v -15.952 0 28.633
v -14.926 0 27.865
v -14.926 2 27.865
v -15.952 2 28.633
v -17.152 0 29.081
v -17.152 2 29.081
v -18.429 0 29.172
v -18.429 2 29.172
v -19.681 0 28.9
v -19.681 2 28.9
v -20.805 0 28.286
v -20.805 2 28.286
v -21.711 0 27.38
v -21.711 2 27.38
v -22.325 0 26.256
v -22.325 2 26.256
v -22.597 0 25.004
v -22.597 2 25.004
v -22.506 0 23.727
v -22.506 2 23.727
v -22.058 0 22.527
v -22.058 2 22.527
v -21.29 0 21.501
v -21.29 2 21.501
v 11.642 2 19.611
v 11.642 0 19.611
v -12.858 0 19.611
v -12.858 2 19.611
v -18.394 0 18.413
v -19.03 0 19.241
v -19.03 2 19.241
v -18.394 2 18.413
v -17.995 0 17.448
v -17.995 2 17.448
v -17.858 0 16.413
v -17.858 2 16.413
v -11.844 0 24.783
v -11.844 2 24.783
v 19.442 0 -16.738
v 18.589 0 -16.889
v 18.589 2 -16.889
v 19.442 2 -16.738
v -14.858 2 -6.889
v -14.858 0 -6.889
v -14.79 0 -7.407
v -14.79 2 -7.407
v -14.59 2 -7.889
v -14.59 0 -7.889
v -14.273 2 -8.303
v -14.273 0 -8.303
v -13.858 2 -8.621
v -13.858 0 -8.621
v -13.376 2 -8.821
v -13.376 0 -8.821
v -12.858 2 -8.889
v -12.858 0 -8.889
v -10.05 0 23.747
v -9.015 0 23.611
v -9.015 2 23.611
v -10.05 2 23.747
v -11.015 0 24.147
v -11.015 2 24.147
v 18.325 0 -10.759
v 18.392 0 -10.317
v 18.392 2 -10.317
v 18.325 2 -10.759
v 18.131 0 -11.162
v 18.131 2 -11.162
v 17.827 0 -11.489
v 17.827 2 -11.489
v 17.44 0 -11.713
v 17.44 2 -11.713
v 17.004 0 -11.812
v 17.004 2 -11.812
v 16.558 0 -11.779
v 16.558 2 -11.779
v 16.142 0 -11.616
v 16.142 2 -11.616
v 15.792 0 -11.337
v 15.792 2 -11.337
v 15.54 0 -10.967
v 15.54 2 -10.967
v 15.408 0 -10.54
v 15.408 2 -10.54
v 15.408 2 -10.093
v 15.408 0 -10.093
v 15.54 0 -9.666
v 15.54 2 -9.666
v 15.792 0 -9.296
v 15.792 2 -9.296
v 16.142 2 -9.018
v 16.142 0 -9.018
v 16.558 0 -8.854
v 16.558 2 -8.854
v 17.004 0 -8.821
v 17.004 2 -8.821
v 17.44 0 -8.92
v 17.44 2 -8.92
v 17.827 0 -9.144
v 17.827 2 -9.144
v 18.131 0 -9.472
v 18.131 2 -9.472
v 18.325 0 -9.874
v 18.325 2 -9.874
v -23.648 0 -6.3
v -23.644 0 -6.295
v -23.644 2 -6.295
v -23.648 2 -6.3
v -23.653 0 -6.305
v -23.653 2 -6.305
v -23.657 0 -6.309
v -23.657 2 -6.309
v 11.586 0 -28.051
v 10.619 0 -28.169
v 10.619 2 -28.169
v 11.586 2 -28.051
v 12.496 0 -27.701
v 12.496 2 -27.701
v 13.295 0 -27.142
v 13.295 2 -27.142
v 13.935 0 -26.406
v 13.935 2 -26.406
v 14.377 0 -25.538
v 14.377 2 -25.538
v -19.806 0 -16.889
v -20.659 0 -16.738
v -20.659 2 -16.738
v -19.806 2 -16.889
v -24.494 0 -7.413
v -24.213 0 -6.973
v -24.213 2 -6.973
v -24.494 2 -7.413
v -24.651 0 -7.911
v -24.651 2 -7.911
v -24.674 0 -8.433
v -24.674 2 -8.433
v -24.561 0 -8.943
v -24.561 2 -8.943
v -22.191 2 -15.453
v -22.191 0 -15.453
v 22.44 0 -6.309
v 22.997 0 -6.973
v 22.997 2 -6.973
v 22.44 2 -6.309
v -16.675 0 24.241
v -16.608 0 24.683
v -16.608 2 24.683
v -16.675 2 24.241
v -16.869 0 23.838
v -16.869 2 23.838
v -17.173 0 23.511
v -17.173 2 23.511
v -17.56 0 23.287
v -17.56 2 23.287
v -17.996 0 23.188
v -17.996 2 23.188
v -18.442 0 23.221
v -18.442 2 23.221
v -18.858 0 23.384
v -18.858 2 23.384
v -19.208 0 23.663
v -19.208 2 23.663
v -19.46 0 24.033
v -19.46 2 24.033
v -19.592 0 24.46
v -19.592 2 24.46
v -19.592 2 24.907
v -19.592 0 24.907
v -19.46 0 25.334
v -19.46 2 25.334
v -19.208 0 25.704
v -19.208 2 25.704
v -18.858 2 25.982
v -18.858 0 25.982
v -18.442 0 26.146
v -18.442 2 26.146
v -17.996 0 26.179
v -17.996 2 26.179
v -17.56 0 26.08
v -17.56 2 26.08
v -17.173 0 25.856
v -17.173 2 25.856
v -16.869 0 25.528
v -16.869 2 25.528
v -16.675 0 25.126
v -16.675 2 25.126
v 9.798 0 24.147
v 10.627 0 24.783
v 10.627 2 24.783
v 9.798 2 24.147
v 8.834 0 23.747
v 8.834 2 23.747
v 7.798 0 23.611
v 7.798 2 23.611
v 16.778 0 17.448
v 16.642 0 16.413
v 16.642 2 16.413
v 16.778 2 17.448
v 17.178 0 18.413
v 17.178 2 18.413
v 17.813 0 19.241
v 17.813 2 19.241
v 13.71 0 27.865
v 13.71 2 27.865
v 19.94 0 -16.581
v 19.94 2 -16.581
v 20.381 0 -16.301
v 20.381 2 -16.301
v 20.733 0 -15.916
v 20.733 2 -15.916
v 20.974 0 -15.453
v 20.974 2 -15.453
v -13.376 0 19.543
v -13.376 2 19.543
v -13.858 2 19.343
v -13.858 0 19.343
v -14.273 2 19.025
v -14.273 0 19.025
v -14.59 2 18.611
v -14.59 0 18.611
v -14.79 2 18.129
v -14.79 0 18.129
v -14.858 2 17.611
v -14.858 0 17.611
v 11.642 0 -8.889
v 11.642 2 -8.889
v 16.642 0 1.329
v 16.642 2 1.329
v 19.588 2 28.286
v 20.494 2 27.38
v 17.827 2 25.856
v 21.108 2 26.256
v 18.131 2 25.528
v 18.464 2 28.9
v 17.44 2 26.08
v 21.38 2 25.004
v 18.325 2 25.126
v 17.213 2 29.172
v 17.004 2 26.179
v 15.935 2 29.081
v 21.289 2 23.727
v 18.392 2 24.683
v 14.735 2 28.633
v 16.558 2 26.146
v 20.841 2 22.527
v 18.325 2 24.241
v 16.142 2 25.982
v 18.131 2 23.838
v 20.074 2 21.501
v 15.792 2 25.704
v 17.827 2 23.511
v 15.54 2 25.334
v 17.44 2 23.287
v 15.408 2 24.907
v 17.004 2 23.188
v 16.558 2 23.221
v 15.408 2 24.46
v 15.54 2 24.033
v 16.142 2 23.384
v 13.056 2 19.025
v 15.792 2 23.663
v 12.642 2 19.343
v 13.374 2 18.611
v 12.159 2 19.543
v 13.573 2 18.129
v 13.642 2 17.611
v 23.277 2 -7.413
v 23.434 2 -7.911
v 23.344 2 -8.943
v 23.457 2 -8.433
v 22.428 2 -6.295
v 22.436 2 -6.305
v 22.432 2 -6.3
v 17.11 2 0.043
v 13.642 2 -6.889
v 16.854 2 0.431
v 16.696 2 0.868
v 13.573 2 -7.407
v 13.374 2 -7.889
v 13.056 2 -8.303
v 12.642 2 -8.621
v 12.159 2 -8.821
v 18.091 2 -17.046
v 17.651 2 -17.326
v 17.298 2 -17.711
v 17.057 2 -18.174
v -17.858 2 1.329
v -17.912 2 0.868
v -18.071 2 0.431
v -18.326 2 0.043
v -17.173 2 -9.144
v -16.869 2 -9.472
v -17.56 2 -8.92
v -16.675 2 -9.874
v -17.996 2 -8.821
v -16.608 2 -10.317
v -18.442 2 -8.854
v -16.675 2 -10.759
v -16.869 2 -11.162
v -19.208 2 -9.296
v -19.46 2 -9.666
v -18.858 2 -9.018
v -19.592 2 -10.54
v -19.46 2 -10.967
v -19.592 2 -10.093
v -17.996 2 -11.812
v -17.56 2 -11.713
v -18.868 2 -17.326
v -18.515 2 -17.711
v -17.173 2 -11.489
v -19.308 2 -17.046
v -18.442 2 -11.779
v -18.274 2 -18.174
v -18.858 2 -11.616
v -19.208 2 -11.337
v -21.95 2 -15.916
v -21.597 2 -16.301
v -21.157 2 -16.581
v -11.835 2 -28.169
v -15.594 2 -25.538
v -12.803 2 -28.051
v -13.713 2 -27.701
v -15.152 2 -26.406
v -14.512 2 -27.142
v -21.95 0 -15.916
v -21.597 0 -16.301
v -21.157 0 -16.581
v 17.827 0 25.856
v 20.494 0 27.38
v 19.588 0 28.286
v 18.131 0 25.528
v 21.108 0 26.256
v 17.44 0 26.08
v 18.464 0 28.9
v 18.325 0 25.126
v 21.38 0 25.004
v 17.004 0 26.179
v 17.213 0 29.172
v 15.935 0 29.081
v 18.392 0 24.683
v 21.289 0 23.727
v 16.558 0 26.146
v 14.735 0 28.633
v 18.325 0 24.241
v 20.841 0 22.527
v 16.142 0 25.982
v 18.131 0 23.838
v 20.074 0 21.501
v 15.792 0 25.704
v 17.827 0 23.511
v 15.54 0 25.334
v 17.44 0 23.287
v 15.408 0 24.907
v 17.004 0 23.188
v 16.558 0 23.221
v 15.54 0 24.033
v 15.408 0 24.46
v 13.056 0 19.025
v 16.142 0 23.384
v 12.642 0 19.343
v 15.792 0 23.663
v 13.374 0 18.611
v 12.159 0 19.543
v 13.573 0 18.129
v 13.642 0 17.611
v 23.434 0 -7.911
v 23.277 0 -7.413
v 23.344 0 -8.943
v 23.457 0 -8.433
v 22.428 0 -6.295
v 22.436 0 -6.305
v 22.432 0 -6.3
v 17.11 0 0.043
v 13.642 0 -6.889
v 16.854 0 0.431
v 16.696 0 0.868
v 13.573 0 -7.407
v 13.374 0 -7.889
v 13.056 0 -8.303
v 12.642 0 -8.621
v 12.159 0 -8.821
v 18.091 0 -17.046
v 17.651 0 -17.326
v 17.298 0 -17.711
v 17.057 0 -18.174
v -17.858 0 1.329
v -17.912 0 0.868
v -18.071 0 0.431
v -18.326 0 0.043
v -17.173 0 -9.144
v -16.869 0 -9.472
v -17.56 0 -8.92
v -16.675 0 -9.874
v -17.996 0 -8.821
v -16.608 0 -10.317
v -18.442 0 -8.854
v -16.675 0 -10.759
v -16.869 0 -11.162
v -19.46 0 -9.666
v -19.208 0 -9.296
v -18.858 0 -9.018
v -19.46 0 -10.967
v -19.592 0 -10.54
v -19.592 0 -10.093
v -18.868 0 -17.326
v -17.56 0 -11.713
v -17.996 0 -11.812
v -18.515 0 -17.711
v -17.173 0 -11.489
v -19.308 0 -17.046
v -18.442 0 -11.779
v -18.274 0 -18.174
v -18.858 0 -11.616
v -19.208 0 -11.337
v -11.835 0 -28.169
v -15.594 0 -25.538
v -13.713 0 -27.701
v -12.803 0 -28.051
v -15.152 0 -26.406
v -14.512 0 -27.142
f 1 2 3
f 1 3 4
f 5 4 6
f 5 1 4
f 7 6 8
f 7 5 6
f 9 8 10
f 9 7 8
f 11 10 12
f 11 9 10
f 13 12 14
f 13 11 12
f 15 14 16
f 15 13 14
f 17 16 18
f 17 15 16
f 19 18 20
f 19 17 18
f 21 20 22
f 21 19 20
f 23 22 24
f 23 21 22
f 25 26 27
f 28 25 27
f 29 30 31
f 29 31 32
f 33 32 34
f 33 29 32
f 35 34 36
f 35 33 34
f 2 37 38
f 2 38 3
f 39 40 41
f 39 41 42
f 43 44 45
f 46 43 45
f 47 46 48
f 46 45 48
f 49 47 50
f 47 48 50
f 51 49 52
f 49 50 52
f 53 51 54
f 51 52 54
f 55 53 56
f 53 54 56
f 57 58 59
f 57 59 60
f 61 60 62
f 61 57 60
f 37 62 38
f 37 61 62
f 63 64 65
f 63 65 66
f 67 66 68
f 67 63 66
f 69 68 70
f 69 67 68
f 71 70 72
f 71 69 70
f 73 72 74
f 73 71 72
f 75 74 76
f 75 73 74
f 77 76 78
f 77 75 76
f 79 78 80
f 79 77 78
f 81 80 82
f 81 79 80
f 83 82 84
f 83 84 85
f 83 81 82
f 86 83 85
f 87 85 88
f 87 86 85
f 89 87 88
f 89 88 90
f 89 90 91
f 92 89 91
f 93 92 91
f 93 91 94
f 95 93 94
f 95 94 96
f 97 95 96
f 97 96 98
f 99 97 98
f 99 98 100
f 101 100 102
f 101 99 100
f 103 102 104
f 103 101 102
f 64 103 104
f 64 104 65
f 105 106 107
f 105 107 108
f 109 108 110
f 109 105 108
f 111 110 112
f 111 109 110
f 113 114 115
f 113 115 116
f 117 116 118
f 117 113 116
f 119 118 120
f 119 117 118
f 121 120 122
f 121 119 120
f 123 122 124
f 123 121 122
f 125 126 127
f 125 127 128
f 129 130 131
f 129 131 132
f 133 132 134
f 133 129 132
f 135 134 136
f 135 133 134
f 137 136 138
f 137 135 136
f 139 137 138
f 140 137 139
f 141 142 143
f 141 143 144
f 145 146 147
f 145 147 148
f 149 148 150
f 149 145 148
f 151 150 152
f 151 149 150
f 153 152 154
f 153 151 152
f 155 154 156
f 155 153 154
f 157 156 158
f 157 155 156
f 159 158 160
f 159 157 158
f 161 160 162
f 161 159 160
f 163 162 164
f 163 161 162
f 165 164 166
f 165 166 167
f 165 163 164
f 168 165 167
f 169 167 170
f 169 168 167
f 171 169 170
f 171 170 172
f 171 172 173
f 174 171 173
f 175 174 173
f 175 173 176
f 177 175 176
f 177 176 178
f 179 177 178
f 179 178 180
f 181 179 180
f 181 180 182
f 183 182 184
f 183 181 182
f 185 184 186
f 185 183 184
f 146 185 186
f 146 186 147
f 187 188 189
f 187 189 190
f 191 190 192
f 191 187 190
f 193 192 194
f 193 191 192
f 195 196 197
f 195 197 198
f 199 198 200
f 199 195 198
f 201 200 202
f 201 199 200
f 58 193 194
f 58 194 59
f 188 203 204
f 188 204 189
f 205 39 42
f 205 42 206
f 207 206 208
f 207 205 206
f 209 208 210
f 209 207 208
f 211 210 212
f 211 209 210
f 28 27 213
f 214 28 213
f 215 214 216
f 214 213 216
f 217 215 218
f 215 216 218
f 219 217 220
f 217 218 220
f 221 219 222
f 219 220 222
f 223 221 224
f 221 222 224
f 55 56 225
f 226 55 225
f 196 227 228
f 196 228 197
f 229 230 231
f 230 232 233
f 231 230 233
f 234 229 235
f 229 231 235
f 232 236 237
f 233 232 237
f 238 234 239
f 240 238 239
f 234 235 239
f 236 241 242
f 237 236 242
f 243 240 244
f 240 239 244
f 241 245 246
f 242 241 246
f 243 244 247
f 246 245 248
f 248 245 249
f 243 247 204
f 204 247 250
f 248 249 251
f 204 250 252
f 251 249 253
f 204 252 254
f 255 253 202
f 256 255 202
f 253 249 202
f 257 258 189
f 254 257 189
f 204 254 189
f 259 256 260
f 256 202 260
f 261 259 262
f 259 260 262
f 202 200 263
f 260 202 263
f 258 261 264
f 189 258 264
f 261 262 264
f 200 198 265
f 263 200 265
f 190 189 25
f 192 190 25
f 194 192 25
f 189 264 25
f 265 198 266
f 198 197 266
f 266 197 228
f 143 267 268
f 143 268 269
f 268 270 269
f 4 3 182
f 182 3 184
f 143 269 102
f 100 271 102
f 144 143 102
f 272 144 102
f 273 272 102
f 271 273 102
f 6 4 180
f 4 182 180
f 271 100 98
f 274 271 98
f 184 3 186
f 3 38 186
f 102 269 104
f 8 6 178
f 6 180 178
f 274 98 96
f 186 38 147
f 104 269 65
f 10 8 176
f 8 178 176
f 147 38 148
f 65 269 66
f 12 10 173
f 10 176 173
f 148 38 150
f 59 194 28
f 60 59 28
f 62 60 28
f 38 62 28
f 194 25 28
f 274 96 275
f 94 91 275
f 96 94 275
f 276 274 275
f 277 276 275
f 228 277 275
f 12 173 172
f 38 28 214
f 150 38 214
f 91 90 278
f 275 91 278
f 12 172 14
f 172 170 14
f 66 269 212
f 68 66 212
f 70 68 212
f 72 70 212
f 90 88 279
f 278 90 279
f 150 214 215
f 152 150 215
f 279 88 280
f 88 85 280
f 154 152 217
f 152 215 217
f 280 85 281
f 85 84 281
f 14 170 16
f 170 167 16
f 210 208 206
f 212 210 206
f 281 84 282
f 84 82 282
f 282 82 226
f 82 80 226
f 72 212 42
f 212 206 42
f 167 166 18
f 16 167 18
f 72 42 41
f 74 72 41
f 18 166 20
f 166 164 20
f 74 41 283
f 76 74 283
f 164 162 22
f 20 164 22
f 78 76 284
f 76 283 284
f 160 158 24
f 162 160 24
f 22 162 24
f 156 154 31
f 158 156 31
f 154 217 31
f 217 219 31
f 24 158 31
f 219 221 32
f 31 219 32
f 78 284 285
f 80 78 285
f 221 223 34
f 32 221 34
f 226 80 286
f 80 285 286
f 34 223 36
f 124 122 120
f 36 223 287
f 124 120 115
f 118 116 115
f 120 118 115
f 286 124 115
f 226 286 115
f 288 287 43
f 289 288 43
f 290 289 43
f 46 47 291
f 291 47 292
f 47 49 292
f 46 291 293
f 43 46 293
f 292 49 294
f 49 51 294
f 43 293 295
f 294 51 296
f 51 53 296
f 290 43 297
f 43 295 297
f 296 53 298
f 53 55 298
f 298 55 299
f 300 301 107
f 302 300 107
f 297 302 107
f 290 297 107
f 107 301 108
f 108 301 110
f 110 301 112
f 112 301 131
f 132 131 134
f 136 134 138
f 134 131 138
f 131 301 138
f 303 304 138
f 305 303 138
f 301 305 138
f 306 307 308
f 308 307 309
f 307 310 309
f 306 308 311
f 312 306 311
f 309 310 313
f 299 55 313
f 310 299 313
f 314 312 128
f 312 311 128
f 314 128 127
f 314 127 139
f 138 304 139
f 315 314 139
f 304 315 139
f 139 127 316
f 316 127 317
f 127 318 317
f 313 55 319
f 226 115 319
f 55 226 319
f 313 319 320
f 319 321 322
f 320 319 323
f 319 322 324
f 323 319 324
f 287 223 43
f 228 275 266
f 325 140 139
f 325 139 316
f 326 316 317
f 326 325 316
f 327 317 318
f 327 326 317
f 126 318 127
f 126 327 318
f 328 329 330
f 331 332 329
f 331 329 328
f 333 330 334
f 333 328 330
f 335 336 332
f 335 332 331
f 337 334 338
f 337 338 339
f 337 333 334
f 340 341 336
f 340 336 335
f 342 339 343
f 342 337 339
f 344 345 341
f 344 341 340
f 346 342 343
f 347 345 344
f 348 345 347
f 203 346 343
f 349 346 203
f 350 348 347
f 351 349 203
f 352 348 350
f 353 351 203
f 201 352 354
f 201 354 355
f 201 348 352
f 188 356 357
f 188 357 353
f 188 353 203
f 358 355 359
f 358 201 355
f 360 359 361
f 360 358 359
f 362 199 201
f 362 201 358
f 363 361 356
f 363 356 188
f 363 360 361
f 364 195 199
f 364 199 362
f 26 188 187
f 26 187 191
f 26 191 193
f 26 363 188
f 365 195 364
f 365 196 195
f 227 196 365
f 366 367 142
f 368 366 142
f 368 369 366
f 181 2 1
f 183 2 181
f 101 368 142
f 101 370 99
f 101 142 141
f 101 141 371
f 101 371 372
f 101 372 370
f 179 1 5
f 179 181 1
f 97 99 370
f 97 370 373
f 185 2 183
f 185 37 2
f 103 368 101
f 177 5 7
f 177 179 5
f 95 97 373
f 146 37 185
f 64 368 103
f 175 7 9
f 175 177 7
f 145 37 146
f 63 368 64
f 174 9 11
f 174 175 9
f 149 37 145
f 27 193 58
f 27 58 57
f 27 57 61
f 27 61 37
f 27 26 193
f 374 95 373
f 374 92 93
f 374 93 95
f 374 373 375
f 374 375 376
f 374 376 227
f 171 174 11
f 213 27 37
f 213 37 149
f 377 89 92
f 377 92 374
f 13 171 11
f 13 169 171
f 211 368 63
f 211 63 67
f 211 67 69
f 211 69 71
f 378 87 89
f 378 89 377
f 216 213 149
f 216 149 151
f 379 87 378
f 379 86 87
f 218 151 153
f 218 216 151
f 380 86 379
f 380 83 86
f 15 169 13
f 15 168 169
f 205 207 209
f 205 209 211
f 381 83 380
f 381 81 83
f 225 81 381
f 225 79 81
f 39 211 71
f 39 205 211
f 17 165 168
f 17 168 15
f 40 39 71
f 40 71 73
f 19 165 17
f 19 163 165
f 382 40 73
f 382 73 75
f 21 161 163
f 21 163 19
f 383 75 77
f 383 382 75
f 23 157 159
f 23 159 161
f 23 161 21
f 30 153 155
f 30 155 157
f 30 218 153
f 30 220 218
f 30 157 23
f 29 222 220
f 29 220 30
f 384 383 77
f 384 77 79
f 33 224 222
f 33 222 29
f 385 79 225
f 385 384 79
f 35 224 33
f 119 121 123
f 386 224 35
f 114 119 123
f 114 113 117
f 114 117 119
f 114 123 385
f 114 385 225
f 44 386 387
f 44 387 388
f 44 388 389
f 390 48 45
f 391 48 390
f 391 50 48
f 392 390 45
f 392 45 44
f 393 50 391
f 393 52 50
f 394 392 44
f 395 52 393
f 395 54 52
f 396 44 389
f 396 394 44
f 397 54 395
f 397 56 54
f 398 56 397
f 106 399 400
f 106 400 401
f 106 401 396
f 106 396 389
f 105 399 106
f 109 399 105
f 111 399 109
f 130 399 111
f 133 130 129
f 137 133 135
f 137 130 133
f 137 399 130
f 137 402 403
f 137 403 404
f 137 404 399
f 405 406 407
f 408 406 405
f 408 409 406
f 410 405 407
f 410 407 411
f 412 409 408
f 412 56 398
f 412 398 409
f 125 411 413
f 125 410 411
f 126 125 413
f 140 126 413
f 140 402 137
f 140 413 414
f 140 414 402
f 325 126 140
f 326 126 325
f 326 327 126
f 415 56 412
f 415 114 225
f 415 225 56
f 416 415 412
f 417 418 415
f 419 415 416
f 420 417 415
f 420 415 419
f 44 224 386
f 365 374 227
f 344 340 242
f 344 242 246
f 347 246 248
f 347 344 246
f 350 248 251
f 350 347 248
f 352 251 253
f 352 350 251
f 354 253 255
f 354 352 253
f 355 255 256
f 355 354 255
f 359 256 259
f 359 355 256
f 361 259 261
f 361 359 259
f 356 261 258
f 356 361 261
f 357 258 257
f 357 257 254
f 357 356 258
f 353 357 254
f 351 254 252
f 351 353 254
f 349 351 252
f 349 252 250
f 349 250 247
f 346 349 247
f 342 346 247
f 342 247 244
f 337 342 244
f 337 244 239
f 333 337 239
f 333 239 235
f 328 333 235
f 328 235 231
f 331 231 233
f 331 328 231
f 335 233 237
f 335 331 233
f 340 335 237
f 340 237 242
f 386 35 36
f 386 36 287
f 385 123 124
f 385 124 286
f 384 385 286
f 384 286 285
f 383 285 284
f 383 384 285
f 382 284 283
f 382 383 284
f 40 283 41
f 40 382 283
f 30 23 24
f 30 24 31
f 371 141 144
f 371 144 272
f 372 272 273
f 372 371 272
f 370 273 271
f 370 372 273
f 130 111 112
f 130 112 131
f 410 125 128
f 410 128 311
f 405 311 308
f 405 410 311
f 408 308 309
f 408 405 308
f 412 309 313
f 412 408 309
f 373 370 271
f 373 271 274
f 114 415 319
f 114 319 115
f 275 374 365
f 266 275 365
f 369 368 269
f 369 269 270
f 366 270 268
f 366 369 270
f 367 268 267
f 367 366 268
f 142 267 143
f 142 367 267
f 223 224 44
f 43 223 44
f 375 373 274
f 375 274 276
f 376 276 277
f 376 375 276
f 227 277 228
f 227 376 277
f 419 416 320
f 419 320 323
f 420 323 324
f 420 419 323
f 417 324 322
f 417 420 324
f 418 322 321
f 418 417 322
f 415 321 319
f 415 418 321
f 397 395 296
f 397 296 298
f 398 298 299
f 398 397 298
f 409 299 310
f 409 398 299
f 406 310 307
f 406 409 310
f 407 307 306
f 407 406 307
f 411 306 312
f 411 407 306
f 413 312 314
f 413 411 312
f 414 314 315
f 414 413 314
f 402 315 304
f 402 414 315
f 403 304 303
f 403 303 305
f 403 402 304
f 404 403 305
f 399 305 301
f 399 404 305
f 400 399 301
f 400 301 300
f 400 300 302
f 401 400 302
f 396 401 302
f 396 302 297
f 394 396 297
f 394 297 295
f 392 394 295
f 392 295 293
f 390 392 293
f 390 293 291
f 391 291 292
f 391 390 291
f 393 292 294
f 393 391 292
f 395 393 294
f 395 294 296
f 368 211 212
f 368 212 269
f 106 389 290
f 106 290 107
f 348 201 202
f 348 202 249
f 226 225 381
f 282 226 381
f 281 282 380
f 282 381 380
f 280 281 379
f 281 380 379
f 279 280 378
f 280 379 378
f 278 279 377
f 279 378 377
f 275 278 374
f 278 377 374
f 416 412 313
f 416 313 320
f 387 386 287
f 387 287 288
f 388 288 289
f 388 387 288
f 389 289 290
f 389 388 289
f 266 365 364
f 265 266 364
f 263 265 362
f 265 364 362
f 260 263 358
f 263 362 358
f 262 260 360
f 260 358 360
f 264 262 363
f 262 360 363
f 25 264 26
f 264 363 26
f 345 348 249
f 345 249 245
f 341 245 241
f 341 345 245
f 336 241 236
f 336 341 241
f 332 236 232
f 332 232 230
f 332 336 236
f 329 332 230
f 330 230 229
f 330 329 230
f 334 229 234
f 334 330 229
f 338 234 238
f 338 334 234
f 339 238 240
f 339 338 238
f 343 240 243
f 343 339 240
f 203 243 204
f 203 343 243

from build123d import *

# Parameters (mm, degrees)
SKETCH1_R           = 1.5
SKETCH1_R_2         = 1.500000075
SKETCH1_R_3         = 1.499999926
BOSS_EXTRUDE1_DEPTH = 2


with BuildPart() as part:
    # Sketch1 → Boss-Extrude1 (new body)
    with BuildSketch(Plane(origin=(0, 0, 0), x_dir=(1, 0, 0), z_dir=(0, 1, 0))):
        with BuildLine():
            Line((16.641623692, -1.328817394), (16.641623692, -16.412584868))
            ThreePointArc((16.641623692, -16.412584868), (16.946106169, -17.943318476), (17.813197688, -19.241011527))
            Line((17.813197688, -19.241011527), (20.073605121, -21.501420823))
            ThreePointArc((20.073605121, -21.501420823), (20.073603258, -27.865380806), (13.709643275, -27.865378943))
            Line((13.709643275, -27.865378943), (10.626761594, -24.782500056))
            ThreePointArc((10.626761594, -24.782500056), (9.329068113, -23.915408358), (7.798334003, -23.610926059))
            Line((7.798334003, -23.610926059), (-9.015085756, -23.610926059))
            ThreePointArc((-9.015085756, -23.610926059), (-10.545819865, -23.915408358), (-11.843513346, -24.782500056))
            Line((-11.843513346, -24.782500056), (-14.926395028, -27.865378943))
            ThreePointArc((-14.926395028, -27.865378943), (-21.290355011, -27.865380806), (-21.290356874, -21.501420823))
            Line((-21.290356874, -21.501420823), (-19.029949441, -19.241011527))
            ThreePointArc((-19.029949441, -19.241011527), (-18.162857921, -17.943318476), (-17.858375444, -16.412584868))
            Line((-17.858375444, -16.412584868), (-17.858375444, -1.328817394))
            ThreePointArc((-17.858375444, -1.328817394), (-17.9789903, -0.644777024), (-18.326286807, -0.043242064))
            Line((-18.326286807, -0.043242064), (-23.644334286, 6.294557068))
            ThreePointArc((-23.644334286, 6.294557068), (-23.650520639, 6.302037606), (-23.656743228, 6.309488031))
            Line((-23.656743228, 6.309488031), (-24.213413357, 6.972902629))
            ThreePointArc((-24.213413357, 6.972902629), (-24.650941114, 7.911183978), (-24.560709133, 8.942523214))
            Line((-24.560709133, 8.942523214), (-22.191124617, 15.452907595))
            ThreePointArc((-22.191124617, 15.452907595), (-21.597313109, 16.300951983), (-20.659035652, 16.738475475))
            Line((-20.659035652, 16.738475475), (-19.806167691, 16.888857993))
            ThreePointArc((-19.806167691, 16.888857993), (-18.867887285, 17.3263878), (-18.274078726, 18.174440774))
            Line((-18.274078726, 18.174440774), (-15.59413655, 25.537521753))
            ThreePointArc((-15.59413655, 25.537521753), (-14.129671055, 27.446048523), (-11.835365205, 28.169439348))
            Line((-11.835365205, 28.169439348), (10.618613453, 28.169439348))
            ThreePointArc((10.618613453, 28.169439348), (12.912919302, 27.446048523), (14.377384798, 25.537521753))
            Line((14.377384798, 25.537521753), (17.057326973, 18.174440774))
            ThreePointArc((17.057326973, 18.174440774), (17.651135533, 17.3263878), (18.589415939, 16.888857993))
            Line((18.589415939, 16.888857993), (19.4422839, 16.738475475))
            ThreePointArc((19.4422839, 16.738475475), (20.380561357, 16.300951983), (20.974372865, 15.452907595))
            Line((20.974372865, 15.452907595), (23.34395738, 8.942523214))
            ThreePointArc((23.34395738, 8.942523214), (23.434189362, 7.911183978), (22.996661604, 6.972902629))
            Line((22.996661604, 6.972902629), (22.439991475, 6.309488031))
            ThreePointArc((22.439991475, 6.309488031), (22.433768887, 6.302037606), (22.427582533, 6.294557068))
            Line((22.427582533, 6.294557068), (17.109535054, -0.043242064))
            ThreePointArc((17.109535054, -0.043242064), (16.762238548, -0.644777024), (16.641623692, -1.328817394))
        make_face()
        with Locations((-18.108375876, 10.316600984)):
            Circle(SKETCH1_R, mode=Mode.SUBTRACT)
        with Locations((-18.108375951, -24.683399883)):
            Circle(SKETCH1_R_2, mode=Mode.SUBTRACT)
        with Locations((16.891624198, -24.683399883)):
            Circle(SKETCH1_R_3, mode=Mode.SUBTRACT)
        with Locations((16.891624124, 10.316600984)):
            Circle(SKETCH1_R, mode=Mode.SUBTRACT)
        with BuildLine():
            Line((-14.858375884, -17.61092135), (-14.858375884, 6.889076146))
            ThreePointArc((-14.858375884, 6.889076146), (-14.272588129, 8.303287628), (-12.858375556, 8.889072749))
            Line((-12.858375556, 8.889072749), (11.641623803, 8.889072749))
            ThreePointArc((11.641623803, 8.889072749), (13.055836377, 8.303287628), (13.641624131, 6.889076146))
            Line((13.641624131, 6.889076146), (13.641624131, -17.61092135))
            ThreePointArc((13.641624131, -17.61092135), (13.055839011, -19.025137649), (11.641623803, -19.610925403))
            Line((11.641623803, -19.610925403), (-12.858375556, -19.610925403))
            ThreePointArc((-12.858375556, -19.610925403), (-14.272590763, -19.025137649), (-14.858375884, -17.61092135))
        make_face(mode=Mode.SUBTRACT)
    extrude(amount=BOSS_EXTRUDE1_DEPTH)


solid = part.part
